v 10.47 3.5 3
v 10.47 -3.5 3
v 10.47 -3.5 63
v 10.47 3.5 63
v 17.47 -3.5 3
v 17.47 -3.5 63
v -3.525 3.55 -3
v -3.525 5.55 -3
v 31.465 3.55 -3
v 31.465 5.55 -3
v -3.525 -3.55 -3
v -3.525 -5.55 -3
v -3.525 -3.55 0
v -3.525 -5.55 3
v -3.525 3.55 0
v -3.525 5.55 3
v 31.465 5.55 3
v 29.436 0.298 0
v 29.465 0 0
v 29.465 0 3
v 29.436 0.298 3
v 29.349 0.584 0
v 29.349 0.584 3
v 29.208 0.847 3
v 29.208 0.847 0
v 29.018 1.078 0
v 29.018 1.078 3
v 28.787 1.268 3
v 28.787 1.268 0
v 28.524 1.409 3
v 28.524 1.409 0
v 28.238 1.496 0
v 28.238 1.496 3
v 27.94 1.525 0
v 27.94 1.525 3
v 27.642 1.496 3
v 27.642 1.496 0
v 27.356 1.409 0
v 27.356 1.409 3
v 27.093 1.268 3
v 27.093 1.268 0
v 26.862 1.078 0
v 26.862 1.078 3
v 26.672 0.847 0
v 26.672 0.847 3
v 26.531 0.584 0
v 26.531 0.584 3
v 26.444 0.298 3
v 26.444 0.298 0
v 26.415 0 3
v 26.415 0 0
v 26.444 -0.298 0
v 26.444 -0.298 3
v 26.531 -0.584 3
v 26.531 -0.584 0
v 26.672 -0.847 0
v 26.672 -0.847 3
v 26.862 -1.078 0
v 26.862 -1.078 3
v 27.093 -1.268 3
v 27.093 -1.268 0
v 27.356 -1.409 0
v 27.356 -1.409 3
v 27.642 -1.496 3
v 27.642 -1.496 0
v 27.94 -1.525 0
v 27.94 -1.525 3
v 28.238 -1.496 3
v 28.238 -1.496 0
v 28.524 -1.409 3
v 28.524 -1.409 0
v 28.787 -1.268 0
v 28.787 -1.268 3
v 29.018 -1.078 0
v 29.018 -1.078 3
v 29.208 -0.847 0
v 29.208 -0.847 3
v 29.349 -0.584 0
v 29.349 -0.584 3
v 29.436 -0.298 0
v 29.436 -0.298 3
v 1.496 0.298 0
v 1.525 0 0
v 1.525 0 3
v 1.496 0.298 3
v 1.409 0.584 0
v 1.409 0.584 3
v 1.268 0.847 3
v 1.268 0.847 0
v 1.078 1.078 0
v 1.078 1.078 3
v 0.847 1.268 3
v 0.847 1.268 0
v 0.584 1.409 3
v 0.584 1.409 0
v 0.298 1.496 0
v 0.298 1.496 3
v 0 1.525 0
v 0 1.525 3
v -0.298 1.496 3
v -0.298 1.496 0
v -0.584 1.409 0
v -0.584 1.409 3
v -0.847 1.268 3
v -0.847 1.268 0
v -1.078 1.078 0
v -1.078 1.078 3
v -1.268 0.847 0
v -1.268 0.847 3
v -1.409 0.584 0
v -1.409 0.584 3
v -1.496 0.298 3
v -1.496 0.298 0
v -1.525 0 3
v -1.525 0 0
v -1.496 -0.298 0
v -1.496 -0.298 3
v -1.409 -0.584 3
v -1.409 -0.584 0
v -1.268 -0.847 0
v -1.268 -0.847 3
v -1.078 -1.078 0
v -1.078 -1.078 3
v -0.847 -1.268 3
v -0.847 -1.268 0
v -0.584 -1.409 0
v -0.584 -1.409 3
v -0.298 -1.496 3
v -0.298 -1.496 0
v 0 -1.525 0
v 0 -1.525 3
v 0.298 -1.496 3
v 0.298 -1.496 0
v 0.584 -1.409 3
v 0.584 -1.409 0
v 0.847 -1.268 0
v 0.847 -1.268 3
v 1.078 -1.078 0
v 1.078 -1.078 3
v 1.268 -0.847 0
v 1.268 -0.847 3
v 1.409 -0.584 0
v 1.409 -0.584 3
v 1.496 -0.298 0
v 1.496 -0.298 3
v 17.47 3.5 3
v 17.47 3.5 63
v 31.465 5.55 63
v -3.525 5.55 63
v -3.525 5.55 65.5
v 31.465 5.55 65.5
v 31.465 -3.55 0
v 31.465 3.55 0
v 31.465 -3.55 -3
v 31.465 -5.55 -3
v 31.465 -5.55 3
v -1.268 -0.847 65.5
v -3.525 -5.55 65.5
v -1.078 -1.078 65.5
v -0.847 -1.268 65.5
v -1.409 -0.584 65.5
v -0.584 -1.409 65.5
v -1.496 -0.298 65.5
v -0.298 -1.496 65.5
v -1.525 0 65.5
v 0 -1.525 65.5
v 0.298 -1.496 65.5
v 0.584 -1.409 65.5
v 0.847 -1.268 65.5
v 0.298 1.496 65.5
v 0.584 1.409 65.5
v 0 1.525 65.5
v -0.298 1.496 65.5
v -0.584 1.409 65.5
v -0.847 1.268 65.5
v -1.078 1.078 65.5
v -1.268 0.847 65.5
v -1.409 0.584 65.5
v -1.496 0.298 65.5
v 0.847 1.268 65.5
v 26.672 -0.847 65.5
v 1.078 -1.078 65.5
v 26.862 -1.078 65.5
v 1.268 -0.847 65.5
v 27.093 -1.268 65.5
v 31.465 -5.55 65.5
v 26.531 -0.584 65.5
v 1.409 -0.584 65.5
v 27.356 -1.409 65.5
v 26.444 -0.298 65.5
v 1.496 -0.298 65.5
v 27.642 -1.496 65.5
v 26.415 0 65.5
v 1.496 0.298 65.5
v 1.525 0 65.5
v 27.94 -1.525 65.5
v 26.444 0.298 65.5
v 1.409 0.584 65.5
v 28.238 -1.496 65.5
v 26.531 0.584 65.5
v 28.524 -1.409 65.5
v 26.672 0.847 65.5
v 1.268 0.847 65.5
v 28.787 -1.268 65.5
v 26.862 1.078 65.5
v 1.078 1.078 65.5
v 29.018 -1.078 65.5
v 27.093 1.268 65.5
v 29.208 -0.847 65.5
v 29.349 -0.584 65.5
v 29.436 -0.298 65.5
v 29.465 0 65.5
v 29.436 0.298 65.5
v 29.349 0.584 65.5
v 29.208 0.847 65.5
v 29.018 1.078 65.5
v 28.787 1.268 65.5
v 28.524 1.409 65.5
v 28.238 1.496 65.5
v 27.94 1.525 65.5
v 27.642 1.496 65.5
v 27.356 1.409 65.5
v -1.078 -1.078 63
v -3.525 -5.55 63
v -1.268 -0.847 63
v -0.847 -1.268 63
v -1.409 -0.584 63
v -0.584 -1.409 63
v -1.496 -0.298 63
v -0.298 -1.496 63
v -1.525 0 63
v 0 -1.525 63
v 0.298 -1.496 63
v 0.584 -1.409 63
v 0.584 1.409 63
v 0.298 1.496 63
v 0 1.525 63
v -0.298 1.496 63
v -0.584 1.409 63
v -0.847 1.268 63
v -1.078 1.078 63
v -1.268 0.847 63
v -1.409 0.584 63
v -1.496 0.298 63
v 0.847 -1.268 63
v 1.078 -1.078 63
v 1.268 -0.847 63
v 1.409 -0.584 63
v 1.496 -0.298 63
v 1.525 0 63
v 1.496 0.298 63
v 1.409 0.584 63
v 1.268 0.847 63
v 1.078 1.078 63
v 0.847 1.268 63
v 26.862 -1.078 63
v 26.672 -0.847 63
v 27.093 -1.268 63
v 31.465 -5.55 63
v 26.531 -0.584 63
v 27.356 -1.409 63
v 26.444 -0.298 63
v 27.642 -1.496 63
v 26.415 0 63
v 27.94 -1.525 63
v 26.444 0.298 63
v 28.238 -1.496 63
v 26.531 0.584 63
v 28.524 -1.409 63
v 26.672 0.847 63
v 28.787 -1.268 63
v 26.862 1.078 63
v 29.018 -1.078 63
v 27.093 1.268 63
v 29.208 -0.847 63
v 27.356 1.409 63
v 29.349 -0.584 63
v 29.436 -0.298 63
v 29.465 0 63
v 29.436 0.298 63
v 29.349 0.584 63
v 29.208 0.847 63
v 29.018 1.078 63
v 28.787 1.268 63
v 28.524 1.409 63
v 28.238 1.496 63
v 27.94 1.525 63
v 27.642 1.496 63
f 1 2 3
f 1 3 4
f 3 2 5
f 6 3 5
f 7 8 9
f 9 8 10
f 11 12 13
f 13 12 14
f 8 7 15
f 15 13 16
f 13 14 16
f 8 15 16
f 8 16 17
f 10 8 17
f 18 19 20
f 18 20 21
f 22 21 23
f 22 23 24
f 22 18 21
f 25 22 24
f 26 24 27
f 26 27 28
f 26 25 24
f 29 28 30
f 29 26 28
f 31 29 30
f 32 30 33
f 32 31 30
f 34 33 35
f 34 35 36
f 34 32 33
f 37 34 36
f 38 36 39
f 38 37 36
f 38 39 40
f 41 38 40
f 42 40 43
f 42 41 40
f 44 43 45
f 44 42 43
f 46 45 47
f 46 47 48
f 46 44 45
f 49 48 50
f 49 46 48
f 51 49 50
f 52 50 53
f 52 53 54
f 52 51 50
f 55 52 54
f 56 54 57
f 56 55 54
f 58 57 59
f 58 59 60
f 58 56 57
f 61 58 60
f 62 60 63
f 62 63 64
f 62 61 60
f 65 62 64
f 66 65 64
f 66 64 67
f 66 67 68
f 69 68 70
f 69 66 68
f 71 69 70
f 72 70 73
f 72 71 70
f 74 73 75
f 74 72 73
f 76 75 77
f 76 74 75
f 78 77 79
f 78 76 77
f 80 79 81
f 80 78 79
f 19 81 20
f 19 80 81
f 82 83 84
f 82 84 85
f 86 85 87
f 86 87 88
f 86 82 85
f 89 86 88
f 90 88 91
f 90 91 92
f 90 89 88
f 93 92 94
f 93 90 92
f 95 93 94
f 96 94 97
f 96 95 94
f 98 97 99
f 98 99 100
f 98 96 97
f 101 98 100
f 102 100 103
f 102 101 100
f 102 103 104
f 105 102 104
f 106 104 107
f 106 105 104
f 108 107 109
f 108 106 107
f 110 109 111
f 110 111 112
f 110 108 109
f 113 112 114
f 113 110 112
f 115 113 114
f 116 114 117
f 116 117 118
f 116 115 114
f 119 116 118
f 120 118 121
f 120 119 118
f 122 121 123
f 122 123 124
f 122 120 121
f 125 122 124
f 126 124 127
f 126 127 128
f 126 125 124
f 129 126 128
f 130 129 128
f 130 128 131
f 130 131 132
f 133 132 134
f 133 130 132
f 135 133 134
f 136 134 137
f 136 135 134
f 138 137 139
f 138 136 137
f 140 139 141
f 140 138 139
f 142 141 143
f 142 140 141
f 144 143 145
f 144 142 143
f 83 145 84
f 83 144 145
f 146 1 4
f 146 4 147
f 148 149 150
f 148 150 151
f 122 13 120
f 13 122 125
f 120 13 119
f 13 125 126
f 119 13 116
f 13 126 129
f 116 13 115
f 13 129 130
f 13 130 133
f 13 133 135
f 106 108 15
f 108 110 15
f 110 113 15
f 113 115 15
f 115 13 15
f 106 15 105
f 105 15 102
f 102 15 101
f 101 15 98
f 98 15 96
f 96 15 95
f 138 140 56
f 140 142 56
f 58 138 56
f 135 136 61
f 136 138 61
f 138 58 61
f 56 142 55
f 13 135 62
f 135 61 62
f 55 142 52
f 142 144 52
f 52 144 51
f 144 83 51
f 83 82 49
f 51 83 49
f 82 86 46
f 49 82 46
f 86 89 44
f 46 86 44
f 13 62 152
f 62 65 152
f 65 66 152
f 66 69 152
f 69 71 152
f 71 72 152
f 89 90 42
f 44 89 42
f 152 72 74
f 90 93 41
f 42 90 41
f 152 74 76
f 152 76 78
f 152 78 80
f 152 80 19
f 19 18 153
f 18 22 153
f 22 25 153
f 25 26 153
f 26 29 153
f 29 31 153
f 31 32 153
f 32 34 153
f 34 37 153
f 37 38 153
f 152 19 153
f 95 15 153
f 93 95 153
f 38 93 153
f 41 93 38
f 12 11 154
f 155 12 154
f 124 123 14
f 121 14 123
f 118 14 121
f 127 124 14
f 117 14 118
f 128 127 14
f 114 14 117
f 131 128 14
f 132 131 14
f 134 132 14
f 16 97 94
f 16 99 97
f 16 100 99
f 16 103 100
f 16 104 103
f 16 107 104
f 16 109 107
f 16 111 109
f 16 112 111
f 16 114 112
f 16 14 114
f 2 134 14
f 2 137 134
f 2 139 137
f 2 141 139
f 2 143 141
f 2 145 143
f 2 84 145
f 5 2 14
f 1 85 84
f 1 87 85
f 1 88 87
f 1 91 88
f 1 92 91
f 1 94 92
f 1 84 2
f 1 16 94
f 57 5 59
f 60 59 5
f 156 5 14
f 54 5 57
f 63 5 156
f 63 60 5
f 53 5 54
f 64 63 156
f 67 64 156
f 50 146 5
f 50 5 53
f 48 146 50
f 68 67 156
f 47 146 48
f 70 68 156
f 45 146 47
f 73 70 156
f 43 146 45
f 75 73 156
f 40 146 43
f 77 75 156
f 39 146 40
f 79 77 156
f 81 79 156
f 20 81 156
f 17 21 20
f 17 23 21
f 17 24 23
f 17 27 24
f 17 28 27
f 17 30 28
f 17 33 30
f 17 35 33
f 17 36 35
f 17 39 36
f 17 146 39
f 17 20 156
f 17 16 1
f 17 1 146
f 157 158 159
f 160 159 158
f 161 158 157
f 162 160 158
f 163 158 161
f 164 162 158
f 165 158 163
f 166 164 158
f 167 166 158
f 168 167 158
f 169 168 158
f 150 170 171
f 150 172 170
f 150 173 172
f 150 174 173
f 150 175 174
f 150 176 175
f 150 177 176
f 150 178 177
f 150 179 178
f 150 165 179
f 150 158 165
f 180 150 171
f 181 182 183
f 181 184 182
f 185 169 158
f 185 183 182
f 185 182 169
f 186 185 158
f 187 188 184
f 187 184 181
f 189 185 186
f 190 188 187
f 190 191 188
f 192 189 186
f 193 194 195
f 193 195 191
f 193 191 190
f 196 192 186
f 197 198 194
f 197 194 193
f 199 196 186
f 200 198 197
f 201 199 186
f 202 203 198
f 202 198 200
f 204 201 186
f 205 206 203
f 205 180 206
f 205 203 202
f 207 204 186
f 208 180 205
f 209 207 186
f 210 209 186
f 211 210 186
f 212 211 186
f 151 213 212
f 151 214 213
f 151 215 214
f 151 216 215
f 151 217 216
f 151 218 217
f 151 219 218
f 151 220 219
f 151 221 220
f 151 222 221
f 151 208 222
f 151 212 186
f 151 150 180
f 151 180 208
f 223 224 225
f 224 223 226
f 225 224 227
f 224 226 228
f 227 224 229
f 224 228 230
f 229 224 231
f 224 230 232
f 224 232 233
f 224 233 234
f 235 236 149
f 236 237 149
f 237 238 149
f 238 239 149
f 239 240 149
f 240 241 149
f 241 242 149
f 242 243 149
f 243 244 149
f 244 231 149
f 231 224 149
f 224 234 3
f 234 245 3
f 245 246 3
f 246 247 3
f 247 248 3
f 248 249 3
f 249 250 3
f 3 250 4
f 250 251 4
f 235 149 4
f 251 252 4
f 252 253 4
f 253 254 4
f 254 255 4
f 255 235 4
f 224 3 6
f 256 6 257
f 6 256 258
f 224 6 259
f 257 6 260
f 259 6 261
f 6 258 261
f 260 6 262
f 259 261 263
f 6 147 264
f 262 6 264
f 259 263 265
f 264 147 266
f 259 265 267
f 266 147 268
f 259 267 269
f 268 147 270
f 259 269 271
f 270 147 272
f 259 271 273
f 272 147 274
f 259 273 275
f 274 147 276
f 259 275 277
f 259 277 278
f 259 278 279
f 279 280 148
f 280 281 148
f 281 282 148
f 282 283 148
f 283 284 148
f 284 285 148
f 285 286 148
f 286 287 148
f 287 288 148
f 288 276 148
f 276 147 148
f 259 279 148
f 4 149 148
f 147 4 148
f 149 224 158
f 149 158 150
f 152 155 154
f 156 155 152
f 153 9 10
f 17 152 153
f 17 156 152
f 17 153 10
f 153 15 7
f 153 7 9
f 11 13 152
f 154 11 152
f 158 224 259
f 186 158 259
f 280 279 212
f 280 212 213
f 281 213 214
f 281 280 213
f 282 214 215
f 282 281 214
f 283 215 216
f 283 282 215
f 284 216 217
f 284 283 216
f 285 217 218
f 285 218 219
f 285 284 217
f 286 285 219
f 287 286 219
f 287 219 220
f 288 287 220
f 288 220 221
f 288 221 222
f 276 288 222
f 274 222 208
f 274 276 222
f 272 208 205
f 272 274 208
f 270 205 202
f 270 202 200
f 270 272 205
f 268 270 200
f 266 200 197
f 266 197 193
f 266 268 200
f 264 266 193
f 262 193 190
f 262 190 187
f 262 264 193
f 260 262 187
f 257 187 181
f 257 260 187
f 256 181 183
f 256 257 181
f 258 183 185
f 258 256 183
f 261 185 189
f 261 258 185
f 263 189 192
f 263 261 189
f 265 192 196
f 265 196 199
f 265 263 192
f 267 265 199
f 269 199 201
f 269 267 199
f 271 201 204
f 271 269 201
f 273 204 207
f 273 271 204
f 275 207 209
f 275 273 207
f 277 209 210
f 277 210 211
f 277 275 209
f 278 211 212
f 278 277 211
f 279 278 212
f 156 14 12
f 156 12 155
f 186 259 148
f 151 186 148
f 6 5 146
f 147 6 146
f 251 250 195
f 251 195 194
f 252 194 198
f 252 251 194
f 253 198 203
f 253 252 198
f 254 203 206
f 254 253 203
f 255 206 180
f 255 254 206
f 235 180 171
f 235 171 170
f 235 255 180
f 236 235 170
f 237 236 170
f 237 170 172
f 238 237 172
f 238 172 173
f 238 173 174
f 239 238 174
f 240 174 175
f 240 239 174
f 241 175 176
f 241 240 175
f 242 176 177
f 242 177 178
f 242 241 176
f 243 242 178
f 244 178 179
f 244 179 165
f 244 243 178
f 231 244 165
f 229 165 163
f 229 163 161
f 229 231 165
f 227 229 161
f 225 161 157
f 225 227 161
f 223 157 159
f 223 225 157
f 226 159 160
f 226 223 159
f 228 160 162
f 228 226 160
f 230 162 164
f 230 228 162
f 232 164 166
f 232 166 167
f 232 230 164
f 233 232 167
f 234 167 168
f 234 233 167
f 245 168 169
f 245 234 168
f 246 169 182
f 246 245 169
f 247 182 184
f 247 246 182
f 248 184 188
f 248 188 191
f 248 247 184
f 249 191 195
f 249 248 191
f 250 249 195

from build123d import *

# Parameters (mm, degrees)
SKETCH2_W           = 34.99
SKETCH2_H           = 7.1
SKETCH2_R           = 1.525
BOSS_EXTRUDE1_DEPTH = 3
SKETCH3_W           = 34.99
SKETCH3_H           = 2
BOSS_EXTRUDE2_DEPTH = 6
SKETCH4_W           = 7
SKETCH4_H           = 7
BOSS_EXTRUDE3_DEPTH = 60
SKETCH5_W           = 34.99
SKETCH5_H           = 11.1
SKETCH5_R           = 1.525
BOSS_EXTRUDE4_DEPTH = 2.5


with BuildPart() as part:
    # Sketch2 → Boss-Extrude1 (new body)
    with BuildSketch(Plane.XY):
        with Locations((13.97, 0)):
            Rectangle(SKETCH2_W, SKETCH2_H)
        Circle(SKETCH2_R, mode=Mode.SUBTRACT)
        with Locations((27.94, 0)):
            Circle(SKETCH2_R, mode=Mode.SUBTRACT)
    extrude(amount=BOSS_EXTRUDE1_DEPTH)

    # Sketch3 → Boss-Extrude2 (add)
    with BuildSketch(Plane.XY.offset(3)):
        with Locations((13.97, -4.55)):
            Rectangle(SKETCH3_W, SKETCH3_H)
        with Locations((13.97, 4.55)):
            Rectangle(SKETCH3_W, SKETCH3_H)
    extrude(amount=-BOSS_EXTRUDE2_DEPTH)

    # Sketch4 → Boss-Extrude3 (add)
    with BuildSketch(Plane.XY.offset(3)):
        with Locations((13.97, 0)):
            Rectangle(SKETCH4_W, SKETCH4_H)
    extrude(amount=BOSS_EXTRUDE3_DEPTH)

    # Sketch5 → Boss-Extrude4 (add)
    with BuildSketch(Plane.XY.offset(63)):
        with Locations((13.97, 0)):
            Rectangle(SKETCH5_W, SKETCH5_H)
        Circle(SKETCH5_R, mode=Mode.SUBTRACT)
        with Locations((27.94, 0)):
            Circle(SKETCH5_R, mode=Mode.SUBTRACT)
    extrude(amount=BOSS_EXTRUDE4_DEPTH)


solid = part.part
